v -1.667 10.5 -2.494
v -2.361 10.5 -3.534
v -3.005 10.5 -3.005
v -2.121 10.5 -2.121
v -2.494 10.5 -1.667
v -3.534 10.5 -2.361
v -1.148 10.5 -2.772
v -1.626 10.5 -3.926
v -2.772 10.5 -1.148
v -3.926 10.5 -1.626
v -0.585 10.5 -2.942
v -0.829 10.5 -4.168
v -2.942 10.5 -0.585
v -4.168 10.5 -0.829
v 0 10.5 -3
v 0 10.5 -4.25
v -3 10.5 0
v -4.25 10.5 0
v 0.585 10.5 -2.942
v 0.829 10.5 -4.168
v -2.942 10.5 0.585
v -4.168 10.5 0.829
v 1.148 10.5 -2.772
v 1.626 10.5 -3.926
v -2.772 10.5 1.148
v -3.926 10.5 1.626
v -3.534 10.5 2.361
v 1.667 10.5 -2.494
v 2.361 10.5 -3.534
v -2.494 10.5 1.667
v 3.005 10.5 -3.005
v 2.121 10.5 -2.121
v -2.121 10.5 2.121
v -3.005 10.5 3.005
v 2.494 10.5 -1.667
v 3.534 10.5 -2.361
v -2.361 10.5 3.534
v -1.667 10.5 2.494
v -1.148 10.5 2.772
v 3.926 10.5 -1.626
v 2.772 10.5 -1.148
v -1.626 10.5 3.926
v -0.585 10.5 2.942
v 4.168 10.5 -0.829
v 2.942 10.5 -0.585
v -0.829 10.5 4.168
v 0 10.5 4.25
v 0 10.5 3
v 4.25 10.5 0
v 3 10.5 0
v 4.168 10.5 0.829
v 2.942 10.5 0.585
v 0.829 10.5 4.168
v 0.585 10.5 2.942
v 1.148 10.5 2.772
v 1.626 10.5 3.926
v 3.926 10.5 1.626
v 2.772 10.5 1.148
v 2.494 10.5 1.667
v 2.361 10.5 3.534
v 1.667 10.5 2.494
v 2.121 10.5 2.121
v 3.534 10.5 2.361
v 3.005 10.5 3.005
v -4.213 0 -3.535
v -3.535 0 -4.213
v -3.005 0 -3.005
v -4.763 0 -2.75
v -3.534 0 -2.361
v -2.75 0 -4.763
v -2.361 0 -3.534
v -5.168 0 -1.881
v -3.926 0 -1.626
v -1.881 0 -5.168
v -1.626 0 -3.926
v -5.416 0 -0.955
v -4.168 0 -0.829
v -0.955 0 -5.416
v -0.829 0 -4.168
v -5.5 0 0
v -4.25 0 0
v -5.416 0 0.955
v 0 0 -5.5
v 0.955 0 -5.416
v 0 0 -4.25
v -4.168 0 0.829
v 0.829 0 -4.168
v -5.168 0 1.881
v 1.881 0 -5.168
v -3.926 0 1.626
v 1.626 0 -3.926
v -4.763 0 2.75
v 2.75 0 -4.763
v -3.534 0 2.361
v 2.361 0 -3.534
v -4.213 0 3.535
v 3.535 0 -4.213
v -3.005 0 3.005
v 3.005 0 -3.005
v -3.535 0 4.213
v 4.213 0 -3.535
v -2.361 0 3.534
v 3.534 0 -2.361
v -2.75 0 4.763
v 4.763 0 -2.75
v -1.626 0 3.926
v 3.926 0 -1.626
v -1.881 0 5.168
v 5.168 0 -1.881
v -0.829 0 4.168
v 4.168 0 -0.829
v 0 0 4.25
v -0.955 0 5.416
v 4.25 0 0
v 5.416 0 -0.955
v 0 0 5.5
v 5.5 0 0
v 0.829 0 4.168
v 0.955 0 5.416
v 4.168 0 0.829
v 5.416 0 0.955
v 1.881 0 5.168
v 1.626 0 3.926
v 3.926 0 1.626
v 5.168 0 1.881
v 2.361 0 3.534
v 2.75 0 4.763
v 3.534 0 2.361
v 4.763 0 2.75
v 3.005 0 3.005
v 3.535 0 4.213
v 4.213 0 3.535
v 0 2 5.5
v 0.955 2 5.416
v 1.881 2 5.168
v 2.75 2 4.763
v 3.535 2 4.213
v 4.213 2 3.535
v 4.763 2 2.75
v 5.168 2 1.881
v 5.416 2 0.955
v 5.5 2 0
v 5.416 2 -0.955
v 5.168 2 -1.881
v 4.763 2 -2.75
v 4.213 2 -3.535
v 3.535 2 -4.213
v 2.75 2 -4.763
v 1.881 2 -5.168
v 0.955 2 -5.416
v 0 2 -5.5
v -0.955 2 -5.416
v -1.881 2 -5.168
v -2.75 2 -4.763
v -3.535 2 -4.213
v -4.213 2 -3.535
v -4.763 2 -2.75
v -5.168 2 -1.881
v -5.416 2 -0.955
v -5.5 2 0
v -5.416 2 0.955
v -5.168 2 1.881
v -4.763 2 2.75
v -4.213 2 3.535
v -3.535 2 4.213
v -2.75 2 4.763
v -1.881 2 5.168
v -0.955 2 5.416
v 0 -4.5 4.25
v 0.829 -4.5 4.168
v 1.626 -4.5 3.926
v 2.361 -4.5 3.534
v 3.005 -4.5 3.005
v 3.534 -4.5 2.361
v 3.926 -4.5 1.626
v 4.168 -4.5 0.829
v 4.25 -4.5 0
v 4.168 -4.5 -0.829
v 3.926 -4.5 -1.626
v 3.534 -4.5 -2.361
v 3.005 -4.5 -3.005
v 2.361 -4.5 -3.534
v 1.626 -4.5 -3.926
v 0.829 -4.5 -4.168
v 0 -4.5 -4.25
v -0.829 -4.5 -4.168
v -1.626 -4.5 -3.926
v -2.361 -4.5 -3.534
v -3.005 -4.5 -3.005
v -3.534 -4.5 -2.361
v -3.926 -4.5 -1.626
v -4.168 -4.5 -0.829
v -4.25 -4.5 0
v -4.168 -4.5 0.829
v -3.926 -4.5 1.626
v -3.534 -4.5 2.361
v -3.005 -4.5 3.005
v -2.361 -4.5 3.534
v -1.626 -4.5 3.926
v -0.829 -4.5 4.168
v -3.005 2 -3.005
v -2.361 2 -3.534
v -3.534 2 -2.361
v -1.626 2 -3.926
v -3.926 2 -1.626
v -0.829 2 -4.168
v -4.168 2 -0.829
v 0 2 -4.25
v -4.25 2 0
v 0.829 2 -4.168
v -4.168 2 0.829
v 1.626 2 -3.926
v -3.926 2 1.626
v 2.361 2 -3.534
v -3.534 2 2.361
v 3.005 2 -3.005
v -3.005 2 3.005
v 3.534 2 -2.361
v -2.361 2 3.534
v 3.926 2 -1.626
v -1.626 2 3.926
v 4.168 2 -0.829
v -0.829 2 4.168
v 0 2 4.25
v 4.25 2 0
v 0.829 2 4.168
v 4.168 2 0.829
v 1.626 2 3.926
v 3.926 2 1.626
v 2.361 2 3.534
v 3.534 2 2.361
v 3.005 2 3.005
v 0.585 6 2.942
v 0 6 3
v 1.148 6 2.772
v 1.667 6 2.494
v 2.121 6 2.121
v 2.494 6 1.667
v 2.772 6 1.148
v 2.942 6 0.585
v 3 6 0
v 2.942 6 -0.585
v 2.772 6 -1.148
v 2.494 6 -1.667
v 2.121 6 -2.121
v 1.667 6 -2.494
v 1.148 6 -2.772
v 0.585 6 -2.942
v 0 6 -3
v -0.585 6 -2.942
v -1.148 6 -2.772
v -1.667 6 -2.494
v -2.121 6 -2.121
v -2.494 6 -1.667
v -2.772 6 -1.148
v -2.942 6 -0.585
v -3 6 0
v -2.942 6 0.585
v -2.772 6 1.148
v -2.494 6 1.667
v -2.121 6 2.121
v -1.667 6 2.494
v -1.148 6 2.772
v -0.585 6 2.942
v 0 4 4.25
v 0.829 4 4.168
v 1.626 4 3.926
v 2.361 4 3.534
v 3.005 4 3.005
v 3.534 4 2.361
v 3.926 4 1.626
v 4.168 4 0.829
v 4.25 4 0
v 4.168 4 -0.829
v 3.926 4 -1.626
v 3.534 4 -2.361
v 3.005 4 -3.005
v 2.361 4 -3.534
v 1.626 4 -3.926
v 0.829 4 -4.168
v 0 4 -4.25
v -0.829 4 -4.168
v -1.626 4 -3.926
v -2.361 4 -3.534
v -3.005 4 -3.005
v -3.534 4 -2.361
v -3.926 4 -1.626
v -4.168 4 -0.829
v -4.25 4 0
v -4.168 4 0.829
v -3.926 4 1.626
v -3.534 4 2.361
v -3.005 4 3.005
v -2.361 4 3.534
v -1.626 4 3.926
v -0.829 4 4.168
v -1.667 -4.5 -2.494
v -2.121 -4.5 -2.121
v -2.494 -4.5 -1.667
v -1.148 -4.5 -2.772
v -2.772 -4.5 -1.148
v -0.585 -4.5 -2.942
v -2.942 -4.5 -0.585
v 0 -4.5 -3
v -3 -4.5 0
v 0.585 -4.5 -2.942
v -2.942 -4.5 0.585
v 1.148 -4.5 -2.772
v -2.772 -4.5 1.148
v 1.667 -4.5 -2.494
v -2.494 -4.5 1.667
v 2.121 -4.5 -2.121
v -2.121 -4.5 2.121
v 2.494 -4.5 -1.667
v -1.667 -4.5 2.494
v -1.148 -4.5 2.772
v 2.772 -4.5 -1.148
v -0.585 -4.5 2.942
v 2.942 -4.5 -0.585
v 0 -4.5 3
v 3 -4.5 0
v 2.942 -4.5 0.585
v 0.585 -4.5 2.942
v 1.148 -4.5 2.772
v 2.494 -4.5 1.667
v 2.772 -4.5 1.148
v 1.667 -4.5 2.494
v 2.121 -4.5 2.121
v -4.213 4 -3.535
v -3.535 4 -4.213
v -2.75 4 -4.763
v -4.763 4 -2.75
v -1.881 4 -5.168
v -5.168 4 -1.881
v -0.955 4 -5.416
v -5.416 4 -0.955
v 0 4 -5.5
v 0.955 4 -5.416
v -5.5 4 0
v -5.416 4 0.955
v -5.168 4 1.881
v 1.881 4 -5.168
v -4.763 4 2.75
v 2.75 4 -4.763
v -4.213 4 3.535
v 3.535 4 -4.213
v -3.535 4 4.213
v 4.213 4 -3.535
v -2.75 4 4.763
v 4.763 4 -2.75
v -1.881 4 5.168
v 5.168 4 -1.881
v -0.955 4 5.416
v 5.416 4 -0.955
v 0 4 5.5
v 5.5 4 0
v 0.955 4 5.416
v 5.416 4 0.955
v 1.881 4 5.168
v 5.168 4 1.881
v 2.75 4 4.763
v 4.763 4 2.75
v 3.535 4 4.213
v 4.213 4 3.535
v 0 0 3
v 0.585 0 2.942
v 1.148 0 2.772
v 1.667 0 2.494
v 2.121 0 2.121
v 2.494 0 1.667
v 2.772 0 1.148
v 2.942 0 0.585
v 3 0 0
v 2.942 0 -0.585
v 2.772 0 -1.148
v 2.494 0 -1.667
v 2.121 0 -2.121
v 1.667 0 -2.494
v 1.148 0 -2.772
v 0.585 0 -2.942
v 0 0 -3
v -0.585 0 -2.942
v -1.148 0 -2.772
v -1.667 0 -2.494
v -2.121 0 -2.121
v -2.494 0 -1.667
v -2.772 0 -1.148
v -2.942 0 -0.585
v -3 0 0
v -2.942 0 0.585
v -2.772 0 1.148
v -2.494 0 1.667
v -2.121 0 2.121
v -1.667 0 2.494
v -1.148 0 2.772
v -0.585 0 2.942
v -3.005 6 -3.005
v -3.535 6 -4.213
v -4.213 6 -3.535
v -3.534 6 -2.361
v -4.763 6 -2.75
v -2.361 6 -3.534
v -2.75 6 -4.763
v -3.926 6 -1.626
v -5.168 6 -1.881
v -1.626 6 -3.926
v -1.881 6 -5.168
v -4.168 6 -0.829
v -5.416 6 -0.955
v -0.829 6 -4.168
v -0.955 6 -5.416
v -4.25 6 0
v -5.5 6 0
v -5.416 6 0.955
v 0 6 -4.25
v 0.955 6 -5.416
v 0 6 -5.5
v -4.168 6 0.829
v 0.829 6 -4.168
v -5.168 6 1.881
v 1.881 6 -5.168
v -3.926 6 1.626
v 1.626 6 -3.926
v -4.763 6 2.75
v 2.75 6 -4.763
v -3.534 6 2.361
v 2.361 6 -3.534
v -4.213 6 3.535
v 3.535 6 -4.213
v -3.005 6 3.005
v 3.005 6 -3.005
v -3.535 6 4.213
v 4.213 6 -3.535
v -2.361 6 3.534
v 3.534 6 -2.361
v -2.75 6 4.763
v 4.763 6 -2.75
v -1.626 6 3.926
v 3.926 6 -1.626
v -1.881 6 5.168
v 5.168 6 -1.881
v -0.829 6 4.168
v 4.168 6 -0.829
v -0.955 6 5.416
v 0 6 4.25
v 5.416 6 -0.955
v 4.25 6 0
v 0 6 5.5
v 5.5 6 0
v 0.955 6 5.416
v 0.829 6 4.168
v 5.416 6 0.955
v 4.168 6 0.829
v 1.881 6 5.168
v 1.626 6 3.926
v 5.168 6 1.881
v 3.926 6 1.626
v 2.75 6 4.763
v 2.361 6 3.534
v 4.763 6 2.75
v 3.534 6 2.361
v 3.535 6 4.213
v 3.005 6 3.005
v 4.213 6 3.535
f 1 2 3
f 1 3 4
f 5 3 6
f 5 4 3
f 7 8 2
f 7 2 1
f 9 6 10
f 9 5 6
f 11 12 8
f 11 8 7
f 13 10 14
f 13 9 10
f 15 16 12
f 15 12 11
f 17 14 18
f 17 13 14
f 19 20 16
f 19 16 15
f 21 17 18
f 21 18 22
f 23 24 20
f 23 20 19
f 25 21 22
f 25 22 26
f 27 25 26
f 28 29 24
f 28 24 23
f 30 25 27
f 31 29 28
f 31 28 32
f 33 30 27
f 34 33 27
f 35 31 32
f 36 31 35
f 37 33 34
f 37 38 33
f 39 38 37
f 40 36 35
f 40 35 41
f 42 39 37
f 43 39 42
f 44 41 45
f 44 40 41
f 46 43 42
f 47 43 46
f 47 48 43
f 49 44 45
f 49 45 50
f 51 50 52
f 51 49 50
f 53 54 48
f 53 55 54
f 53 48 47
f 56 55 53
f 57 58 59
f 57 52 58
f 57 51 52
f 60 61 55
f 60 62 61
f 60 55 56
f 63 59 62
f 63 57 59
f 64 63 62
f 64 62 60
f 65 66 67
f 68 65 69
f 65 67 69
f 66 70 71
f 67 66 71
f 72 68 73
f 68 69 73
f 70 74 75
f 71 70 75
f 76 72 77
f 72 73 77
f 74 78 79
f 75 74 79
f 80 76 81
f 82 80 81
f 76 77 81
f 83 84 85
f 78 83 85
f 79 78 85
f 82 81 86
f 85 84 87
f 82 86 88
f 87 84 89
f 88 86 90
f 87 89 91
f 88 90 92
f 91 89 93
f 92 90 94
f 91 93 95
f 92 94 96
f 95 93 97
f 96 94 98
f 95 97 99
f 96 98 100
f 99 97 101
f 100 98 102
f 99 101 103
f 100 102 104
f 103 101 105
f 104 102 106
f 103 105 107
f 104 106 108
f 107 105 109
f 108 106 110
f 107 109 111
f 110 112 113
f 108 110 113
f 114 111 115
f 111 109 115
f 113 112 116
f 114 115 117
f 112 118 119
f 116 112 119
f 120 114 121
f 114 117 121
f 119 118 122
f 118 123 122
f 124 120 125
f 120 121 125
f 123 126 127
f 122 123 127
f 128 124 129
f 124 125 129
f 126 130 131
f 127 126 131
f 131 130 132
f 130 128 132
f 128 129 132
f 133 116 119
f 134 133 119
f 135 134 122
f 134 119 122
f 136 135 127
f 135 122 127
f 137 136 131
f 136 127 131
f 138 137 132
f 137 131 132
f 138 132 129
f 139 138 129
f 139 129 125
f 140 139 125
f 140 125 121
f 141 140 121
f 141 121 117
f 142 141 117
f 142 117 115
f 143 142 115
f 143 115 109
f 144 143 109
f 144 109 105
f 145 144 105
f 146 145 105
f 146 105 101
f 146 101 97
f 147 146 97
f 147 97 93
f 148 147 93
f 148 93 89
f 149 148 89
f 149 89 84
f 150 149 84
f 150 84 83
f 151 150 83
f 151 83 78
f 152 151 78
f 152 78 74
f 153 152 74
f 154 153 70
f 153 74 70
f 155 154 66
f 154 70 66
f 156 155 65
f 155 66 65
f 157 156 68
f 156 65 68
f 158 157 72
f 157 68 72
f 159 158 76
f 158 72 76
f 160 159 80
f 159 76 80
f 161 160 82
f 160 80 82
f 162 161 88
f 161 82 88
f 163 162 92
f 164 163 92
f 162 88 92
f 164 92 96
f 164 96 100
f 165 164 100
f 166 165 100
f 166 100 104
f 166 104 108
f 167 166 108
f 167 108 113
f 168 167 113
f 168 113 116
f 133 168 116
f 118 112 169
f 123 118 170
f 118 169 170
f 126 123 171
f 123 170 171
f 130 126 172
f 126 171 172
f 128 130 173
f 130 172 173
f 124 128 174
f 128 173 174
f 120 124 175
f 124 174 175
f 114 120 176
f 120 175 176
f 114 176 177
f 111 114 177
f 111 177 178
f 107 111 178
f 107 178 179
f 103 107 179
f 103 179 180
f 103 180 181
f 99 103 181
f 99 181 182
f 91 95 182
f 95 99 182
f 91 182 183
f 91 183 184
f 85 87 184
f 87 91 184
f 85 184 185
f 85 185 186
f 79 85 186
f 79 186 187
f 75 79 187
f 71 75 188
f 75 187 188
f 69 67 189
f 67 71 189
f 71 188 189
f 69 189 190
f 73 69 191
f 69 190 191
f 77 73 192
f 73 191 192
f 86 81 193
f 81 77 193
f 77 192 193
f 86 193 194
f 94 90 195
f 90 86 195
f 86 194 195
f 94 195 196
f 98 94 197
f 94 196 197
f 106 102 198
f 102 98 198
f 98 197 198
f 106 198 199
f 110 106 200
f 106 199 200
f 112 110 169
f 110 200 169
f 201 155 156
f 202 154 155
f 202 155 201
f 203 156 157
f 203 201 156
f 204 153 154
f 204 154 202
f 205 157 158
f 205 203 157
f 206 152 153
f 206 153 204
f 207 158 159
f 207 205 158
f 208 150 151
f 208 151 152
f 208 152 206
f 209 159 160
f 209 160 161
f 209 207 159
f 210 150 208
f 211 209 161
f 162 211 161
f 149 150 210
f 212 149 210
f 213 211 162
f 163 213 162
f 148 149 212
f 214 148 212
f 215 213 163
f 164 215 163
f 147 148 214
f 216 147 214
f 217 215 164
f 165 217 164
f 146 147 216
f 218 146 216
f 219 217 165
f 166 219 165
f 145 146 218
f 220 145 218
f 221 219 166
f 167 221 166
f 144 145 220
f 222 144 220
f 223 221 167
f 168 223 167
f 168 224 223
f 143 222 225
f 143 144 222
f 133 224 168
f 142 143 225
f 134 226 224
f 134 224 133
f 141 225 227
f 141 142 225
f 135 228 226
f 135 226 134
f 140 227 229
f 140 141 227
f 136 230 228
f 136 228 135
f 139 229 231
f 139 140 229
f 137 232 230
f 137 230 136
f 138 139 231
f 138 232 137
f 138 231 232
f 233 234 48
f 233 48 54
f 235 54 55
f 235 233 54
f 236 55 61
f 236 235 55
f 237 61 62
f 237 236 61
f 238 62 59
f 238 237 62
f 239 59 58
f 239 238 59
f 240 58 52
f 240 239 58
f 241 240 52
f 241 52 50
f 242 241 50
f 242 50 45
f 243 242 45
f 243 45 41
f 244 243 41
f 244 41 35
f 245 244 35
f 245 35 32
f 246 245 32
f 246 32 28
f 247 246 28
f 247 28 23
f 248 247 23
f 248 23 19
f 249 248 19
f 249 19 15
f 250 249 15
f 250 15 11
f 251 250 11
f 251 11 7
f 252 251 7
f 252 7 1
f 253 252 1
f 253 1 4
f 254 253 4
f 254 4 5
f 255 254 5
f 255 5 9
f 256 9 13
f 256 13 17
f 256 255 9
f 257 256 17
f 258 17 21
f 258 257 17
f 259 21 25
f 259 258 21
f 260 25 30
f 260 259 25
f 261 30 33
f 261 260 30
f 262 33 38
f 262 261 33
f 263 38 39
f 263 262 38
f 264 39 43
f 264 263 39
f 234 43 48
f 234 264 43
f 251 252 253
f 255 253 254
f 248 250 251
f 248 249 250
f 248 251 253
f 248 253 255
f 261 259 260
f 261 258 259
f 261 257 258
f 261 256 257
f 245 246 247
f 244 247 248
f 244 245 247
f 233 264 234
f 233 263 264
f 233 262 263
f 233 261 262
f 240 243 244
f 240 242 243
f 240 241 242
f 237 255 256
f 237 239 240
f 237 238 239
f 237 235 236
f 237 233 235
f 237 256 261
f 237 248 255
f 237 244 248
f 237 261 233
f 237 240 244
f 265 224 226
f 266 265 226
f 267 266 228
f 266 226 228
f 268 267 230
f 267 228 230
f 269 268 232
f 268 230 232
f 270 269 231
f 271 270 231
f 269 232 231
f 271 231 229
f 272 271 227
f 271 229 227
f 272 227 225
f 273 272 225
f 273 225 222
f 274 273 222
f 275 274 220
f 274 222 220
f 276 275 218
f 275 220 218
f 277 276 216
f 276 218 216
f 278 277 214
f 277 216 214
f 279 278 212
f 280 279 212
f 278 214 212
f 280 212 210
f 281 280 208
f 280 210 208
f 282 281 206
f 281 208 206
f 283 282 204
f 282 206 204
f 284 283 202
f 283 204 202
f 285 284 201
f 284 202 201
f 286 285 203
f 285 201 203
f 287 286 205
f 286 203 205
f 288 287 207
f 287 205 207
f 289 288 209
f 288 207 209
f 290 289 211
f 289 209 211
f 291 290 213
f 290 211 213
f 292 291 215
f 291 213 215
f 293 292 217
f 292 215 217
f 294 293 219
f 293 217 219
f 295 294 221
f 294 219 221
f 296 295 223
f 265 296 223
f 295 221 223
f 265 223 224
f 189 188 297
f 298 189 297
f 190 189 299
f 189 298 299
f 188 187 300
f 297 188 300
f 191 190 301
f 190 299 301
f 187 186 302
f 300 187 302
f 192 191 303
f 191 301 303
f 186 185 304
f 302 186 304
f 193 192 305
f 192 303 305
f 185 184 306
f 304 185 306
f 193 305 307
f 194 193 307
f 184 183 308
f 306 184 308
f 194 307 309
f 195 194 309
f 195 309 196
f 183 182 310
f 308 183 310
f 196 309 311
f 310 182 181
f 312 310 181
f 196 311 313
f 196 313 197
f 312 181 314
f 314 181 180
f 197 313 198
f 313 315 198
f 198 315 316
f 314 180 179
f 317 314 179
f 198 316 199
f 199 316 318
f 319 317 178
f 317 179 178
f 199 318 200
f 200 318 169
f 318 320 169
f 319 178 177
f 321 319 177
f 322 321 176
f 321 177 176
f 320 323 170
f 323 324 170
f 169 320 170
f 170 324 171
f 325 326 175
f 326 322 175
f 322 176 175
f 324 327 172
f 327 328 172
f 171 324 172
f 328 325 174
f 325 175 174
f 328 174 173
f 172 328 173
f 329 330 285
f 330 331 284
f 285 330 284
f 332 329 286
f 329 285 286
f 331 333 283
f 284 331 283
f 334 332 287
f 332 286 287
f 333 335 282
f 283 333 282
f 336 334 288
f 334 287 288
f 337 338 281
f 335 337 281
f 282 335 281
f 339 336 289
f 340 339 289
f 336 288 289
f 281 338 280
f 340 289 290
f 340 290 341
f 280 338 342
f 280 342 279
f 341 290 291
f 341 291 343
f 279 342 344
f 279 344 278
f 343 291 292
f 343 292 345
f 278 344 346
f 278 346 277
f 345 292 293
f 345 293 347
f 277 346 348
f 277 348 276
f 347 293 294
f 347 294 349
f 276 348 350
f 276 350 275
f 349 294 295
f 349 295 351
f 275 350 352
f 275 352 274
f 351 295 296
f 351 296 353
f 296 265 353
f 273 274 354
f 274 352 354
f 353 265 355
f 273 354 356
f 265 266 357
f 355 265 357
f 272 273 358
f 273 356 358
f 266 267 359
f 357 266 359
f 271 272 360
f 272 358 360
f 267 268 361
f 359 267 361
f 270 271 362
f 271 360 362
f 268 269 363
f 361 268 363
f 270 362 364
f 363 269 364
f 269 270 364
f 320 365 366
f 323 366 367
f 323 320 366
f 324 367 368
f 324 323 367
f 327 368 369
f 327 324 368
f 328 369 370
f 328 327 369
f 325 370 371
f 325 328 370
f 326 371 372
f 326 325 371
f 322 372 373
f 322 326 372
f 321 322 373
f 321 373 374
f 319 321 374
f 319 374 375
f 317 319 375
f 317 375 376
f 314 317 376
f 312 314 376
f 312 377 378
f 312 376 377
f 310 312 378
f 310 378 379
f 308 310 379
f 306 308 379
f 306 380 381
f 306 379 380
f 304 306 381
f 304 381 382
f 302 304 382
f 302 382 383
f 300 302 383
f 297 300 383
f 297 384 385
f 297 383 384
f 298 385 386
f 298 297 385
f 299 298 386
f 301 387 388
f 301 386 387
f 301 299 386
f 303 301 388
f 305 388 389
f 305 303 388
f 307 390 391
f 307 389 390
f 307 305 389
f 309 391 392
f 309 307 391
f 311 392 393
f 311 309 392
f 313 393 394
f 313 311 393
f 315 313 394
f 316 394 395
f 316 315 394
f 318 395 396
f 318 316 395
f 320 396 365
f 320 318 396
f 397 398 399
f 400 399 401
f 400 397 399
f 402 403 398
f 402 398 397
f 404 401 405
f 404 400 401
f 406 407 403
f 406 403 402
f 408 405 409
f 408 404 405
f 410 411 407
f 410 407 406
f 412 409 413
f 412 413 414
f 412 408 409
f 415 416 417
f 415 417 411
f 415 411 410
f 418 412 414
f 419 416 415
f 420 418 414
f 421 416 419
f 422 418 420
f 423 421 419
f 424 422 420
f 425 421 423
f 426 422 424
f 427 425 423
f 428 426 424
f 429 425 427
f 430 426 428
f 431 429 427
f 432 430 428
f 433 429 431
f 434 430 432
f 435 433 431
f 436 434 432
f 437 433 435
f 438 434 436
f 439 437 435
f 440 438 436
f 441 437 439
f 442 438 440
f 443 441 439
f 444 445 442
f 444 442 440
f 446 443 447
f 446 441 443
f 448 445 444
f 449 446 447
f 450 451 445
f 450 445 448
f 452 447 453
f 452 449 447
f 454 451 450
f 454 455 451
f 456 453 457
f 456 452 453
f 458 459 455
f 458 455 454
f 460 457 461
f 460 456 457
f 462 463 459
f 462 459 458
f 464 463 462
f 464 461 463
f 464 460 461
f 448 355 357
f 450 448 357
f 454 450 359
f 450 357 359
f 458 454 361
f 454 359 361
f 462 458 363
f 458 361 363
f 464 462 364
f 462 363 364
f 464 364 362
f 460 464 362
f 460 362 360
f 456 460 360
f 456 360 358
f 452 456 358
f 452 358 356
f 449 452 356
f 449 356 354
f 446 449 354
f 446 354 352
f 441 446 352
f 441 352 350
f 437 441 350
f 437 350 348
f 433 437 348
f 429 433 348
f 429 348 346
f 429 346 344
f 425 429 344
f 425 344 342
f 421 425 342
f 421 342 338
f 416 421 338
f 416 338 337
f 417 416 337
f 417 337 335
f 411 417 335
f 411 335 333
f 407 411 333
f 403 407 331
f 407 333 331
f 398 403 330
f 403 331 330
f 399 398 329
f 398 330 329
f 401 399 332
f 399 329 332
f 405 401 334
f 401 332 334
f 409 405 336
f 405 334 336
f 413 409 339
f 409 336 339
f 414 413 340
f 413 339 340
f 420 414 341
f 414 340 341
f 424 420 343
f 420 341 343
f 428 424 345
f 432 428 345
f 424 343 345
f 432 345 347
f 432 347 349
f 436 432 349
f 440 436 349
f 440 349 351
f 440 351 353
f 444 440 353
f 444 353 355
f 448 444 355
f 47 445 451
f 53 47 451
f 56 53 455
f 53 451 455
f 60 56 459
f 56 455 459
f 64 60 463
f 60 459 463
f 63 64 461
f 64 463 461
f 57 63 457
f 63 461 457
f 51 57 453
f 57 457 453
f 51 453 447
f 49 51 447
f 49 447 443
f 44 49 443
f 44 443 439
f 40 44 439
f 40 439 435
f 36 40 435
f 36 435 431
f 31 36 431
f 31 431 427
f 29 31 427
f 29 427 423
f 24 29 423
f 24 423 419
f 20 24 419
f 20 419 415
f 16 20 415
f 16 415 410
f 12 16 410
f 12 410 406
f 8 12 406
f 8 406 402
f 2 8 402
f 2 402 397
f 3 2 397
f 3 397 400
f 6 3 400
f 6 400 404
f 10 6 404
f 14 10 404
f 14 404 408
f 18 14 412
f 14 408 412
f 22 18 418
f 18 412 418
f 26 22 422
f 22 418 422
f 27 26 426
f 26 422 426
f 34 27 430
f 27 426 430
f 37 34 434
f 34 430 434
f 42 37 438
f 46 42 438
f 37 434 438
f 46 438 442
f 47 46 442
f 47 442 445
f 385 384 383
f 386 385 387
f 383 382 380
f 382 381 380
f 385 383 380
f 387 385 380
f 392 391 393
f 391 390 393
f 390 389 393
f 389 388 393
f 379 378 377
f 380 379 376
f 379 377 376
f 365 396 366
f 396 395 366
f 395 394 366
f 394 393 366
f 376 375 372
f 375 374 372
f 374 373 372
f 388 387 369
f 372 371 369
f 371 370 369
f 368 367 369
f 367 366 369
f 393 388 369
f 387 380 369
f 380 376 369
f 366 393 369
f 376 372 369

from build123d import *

# Parameters (mm, degrees)
SKETCH_1_R           = 5.5
EXTRUDE_1_DEPTH      = 6
EXTRUDE_2_DEPTH      = 4.5
EXTRUDE_2_DEPTH_BACK = 10.5
SKETCH_2_R           = 4.25
SKETCH_2_R_2         = 3
CUT_EXTRUDE_START    = -2
SKETCH_3_R           = 5.5
SKETCH_3_R_2         = 4.25
CUT_EXTRUDE_1_DEPTH  = 2


with BuildPart() as part:
    # 草图1 → 拉伸1 (new body)
    with BuildSketch(Plane(origin=(0, 0, 0), x_dir=(1, 0, 0), z_dir=(0, 1, 0))):
        with Locations(Location((0, 0, 0), (0, 0, 270))):
            Circle(SKETCH_1_R)
    extrude(amount=EXTRUDE_1_DEPTH)

    # 草图2 → 拉伸2 (add, two sides: drawn at the far end of the back side and taken through both)
    with BuildSketch(Plane(origin=(0, 6, 0), x_dir=(-1, 0, 0), z_dir=(0, 1, 0)).offset(-EXTRUDE_2_DEPTH_BACK)):
        with Locations(Location((0, 0, 0), (0, 0, 90))):
            Circle(SKETCH_2_R)
        with Locations(Location((0, 0, 0), (0, 0, 90))):
            Circle(SKETCH_2_R_2, mode=Mode.SUBTRACT)
    extrude(amount=EXTRUDE_2_DEPTH + EXTRUDE_2_DEPTH_BACK)

    # 草图3 → 切除-拉伸1 (cut)
    with BuildSketch(Plane(origin=(0, 4, 0), x_dir=(-1, 0, 0), z_dir=(0, 1, 0)).offset(CUT_EXTRUDE_START)):
        with Locations(Location((0, 0, 0), (0, 0, 90))):
            Circle(SKETCH_3_R)
        with Locations(Location((0, 0, 0), (0, 0, 90))):
            Circle(SKETCH_3_R_2, mode=Mode.SUBTRACT)
    extrude(amount=CUT_EXTRUDE_1_DEPTH, mode=Mode.SUBTRACT)


solid = part.part
